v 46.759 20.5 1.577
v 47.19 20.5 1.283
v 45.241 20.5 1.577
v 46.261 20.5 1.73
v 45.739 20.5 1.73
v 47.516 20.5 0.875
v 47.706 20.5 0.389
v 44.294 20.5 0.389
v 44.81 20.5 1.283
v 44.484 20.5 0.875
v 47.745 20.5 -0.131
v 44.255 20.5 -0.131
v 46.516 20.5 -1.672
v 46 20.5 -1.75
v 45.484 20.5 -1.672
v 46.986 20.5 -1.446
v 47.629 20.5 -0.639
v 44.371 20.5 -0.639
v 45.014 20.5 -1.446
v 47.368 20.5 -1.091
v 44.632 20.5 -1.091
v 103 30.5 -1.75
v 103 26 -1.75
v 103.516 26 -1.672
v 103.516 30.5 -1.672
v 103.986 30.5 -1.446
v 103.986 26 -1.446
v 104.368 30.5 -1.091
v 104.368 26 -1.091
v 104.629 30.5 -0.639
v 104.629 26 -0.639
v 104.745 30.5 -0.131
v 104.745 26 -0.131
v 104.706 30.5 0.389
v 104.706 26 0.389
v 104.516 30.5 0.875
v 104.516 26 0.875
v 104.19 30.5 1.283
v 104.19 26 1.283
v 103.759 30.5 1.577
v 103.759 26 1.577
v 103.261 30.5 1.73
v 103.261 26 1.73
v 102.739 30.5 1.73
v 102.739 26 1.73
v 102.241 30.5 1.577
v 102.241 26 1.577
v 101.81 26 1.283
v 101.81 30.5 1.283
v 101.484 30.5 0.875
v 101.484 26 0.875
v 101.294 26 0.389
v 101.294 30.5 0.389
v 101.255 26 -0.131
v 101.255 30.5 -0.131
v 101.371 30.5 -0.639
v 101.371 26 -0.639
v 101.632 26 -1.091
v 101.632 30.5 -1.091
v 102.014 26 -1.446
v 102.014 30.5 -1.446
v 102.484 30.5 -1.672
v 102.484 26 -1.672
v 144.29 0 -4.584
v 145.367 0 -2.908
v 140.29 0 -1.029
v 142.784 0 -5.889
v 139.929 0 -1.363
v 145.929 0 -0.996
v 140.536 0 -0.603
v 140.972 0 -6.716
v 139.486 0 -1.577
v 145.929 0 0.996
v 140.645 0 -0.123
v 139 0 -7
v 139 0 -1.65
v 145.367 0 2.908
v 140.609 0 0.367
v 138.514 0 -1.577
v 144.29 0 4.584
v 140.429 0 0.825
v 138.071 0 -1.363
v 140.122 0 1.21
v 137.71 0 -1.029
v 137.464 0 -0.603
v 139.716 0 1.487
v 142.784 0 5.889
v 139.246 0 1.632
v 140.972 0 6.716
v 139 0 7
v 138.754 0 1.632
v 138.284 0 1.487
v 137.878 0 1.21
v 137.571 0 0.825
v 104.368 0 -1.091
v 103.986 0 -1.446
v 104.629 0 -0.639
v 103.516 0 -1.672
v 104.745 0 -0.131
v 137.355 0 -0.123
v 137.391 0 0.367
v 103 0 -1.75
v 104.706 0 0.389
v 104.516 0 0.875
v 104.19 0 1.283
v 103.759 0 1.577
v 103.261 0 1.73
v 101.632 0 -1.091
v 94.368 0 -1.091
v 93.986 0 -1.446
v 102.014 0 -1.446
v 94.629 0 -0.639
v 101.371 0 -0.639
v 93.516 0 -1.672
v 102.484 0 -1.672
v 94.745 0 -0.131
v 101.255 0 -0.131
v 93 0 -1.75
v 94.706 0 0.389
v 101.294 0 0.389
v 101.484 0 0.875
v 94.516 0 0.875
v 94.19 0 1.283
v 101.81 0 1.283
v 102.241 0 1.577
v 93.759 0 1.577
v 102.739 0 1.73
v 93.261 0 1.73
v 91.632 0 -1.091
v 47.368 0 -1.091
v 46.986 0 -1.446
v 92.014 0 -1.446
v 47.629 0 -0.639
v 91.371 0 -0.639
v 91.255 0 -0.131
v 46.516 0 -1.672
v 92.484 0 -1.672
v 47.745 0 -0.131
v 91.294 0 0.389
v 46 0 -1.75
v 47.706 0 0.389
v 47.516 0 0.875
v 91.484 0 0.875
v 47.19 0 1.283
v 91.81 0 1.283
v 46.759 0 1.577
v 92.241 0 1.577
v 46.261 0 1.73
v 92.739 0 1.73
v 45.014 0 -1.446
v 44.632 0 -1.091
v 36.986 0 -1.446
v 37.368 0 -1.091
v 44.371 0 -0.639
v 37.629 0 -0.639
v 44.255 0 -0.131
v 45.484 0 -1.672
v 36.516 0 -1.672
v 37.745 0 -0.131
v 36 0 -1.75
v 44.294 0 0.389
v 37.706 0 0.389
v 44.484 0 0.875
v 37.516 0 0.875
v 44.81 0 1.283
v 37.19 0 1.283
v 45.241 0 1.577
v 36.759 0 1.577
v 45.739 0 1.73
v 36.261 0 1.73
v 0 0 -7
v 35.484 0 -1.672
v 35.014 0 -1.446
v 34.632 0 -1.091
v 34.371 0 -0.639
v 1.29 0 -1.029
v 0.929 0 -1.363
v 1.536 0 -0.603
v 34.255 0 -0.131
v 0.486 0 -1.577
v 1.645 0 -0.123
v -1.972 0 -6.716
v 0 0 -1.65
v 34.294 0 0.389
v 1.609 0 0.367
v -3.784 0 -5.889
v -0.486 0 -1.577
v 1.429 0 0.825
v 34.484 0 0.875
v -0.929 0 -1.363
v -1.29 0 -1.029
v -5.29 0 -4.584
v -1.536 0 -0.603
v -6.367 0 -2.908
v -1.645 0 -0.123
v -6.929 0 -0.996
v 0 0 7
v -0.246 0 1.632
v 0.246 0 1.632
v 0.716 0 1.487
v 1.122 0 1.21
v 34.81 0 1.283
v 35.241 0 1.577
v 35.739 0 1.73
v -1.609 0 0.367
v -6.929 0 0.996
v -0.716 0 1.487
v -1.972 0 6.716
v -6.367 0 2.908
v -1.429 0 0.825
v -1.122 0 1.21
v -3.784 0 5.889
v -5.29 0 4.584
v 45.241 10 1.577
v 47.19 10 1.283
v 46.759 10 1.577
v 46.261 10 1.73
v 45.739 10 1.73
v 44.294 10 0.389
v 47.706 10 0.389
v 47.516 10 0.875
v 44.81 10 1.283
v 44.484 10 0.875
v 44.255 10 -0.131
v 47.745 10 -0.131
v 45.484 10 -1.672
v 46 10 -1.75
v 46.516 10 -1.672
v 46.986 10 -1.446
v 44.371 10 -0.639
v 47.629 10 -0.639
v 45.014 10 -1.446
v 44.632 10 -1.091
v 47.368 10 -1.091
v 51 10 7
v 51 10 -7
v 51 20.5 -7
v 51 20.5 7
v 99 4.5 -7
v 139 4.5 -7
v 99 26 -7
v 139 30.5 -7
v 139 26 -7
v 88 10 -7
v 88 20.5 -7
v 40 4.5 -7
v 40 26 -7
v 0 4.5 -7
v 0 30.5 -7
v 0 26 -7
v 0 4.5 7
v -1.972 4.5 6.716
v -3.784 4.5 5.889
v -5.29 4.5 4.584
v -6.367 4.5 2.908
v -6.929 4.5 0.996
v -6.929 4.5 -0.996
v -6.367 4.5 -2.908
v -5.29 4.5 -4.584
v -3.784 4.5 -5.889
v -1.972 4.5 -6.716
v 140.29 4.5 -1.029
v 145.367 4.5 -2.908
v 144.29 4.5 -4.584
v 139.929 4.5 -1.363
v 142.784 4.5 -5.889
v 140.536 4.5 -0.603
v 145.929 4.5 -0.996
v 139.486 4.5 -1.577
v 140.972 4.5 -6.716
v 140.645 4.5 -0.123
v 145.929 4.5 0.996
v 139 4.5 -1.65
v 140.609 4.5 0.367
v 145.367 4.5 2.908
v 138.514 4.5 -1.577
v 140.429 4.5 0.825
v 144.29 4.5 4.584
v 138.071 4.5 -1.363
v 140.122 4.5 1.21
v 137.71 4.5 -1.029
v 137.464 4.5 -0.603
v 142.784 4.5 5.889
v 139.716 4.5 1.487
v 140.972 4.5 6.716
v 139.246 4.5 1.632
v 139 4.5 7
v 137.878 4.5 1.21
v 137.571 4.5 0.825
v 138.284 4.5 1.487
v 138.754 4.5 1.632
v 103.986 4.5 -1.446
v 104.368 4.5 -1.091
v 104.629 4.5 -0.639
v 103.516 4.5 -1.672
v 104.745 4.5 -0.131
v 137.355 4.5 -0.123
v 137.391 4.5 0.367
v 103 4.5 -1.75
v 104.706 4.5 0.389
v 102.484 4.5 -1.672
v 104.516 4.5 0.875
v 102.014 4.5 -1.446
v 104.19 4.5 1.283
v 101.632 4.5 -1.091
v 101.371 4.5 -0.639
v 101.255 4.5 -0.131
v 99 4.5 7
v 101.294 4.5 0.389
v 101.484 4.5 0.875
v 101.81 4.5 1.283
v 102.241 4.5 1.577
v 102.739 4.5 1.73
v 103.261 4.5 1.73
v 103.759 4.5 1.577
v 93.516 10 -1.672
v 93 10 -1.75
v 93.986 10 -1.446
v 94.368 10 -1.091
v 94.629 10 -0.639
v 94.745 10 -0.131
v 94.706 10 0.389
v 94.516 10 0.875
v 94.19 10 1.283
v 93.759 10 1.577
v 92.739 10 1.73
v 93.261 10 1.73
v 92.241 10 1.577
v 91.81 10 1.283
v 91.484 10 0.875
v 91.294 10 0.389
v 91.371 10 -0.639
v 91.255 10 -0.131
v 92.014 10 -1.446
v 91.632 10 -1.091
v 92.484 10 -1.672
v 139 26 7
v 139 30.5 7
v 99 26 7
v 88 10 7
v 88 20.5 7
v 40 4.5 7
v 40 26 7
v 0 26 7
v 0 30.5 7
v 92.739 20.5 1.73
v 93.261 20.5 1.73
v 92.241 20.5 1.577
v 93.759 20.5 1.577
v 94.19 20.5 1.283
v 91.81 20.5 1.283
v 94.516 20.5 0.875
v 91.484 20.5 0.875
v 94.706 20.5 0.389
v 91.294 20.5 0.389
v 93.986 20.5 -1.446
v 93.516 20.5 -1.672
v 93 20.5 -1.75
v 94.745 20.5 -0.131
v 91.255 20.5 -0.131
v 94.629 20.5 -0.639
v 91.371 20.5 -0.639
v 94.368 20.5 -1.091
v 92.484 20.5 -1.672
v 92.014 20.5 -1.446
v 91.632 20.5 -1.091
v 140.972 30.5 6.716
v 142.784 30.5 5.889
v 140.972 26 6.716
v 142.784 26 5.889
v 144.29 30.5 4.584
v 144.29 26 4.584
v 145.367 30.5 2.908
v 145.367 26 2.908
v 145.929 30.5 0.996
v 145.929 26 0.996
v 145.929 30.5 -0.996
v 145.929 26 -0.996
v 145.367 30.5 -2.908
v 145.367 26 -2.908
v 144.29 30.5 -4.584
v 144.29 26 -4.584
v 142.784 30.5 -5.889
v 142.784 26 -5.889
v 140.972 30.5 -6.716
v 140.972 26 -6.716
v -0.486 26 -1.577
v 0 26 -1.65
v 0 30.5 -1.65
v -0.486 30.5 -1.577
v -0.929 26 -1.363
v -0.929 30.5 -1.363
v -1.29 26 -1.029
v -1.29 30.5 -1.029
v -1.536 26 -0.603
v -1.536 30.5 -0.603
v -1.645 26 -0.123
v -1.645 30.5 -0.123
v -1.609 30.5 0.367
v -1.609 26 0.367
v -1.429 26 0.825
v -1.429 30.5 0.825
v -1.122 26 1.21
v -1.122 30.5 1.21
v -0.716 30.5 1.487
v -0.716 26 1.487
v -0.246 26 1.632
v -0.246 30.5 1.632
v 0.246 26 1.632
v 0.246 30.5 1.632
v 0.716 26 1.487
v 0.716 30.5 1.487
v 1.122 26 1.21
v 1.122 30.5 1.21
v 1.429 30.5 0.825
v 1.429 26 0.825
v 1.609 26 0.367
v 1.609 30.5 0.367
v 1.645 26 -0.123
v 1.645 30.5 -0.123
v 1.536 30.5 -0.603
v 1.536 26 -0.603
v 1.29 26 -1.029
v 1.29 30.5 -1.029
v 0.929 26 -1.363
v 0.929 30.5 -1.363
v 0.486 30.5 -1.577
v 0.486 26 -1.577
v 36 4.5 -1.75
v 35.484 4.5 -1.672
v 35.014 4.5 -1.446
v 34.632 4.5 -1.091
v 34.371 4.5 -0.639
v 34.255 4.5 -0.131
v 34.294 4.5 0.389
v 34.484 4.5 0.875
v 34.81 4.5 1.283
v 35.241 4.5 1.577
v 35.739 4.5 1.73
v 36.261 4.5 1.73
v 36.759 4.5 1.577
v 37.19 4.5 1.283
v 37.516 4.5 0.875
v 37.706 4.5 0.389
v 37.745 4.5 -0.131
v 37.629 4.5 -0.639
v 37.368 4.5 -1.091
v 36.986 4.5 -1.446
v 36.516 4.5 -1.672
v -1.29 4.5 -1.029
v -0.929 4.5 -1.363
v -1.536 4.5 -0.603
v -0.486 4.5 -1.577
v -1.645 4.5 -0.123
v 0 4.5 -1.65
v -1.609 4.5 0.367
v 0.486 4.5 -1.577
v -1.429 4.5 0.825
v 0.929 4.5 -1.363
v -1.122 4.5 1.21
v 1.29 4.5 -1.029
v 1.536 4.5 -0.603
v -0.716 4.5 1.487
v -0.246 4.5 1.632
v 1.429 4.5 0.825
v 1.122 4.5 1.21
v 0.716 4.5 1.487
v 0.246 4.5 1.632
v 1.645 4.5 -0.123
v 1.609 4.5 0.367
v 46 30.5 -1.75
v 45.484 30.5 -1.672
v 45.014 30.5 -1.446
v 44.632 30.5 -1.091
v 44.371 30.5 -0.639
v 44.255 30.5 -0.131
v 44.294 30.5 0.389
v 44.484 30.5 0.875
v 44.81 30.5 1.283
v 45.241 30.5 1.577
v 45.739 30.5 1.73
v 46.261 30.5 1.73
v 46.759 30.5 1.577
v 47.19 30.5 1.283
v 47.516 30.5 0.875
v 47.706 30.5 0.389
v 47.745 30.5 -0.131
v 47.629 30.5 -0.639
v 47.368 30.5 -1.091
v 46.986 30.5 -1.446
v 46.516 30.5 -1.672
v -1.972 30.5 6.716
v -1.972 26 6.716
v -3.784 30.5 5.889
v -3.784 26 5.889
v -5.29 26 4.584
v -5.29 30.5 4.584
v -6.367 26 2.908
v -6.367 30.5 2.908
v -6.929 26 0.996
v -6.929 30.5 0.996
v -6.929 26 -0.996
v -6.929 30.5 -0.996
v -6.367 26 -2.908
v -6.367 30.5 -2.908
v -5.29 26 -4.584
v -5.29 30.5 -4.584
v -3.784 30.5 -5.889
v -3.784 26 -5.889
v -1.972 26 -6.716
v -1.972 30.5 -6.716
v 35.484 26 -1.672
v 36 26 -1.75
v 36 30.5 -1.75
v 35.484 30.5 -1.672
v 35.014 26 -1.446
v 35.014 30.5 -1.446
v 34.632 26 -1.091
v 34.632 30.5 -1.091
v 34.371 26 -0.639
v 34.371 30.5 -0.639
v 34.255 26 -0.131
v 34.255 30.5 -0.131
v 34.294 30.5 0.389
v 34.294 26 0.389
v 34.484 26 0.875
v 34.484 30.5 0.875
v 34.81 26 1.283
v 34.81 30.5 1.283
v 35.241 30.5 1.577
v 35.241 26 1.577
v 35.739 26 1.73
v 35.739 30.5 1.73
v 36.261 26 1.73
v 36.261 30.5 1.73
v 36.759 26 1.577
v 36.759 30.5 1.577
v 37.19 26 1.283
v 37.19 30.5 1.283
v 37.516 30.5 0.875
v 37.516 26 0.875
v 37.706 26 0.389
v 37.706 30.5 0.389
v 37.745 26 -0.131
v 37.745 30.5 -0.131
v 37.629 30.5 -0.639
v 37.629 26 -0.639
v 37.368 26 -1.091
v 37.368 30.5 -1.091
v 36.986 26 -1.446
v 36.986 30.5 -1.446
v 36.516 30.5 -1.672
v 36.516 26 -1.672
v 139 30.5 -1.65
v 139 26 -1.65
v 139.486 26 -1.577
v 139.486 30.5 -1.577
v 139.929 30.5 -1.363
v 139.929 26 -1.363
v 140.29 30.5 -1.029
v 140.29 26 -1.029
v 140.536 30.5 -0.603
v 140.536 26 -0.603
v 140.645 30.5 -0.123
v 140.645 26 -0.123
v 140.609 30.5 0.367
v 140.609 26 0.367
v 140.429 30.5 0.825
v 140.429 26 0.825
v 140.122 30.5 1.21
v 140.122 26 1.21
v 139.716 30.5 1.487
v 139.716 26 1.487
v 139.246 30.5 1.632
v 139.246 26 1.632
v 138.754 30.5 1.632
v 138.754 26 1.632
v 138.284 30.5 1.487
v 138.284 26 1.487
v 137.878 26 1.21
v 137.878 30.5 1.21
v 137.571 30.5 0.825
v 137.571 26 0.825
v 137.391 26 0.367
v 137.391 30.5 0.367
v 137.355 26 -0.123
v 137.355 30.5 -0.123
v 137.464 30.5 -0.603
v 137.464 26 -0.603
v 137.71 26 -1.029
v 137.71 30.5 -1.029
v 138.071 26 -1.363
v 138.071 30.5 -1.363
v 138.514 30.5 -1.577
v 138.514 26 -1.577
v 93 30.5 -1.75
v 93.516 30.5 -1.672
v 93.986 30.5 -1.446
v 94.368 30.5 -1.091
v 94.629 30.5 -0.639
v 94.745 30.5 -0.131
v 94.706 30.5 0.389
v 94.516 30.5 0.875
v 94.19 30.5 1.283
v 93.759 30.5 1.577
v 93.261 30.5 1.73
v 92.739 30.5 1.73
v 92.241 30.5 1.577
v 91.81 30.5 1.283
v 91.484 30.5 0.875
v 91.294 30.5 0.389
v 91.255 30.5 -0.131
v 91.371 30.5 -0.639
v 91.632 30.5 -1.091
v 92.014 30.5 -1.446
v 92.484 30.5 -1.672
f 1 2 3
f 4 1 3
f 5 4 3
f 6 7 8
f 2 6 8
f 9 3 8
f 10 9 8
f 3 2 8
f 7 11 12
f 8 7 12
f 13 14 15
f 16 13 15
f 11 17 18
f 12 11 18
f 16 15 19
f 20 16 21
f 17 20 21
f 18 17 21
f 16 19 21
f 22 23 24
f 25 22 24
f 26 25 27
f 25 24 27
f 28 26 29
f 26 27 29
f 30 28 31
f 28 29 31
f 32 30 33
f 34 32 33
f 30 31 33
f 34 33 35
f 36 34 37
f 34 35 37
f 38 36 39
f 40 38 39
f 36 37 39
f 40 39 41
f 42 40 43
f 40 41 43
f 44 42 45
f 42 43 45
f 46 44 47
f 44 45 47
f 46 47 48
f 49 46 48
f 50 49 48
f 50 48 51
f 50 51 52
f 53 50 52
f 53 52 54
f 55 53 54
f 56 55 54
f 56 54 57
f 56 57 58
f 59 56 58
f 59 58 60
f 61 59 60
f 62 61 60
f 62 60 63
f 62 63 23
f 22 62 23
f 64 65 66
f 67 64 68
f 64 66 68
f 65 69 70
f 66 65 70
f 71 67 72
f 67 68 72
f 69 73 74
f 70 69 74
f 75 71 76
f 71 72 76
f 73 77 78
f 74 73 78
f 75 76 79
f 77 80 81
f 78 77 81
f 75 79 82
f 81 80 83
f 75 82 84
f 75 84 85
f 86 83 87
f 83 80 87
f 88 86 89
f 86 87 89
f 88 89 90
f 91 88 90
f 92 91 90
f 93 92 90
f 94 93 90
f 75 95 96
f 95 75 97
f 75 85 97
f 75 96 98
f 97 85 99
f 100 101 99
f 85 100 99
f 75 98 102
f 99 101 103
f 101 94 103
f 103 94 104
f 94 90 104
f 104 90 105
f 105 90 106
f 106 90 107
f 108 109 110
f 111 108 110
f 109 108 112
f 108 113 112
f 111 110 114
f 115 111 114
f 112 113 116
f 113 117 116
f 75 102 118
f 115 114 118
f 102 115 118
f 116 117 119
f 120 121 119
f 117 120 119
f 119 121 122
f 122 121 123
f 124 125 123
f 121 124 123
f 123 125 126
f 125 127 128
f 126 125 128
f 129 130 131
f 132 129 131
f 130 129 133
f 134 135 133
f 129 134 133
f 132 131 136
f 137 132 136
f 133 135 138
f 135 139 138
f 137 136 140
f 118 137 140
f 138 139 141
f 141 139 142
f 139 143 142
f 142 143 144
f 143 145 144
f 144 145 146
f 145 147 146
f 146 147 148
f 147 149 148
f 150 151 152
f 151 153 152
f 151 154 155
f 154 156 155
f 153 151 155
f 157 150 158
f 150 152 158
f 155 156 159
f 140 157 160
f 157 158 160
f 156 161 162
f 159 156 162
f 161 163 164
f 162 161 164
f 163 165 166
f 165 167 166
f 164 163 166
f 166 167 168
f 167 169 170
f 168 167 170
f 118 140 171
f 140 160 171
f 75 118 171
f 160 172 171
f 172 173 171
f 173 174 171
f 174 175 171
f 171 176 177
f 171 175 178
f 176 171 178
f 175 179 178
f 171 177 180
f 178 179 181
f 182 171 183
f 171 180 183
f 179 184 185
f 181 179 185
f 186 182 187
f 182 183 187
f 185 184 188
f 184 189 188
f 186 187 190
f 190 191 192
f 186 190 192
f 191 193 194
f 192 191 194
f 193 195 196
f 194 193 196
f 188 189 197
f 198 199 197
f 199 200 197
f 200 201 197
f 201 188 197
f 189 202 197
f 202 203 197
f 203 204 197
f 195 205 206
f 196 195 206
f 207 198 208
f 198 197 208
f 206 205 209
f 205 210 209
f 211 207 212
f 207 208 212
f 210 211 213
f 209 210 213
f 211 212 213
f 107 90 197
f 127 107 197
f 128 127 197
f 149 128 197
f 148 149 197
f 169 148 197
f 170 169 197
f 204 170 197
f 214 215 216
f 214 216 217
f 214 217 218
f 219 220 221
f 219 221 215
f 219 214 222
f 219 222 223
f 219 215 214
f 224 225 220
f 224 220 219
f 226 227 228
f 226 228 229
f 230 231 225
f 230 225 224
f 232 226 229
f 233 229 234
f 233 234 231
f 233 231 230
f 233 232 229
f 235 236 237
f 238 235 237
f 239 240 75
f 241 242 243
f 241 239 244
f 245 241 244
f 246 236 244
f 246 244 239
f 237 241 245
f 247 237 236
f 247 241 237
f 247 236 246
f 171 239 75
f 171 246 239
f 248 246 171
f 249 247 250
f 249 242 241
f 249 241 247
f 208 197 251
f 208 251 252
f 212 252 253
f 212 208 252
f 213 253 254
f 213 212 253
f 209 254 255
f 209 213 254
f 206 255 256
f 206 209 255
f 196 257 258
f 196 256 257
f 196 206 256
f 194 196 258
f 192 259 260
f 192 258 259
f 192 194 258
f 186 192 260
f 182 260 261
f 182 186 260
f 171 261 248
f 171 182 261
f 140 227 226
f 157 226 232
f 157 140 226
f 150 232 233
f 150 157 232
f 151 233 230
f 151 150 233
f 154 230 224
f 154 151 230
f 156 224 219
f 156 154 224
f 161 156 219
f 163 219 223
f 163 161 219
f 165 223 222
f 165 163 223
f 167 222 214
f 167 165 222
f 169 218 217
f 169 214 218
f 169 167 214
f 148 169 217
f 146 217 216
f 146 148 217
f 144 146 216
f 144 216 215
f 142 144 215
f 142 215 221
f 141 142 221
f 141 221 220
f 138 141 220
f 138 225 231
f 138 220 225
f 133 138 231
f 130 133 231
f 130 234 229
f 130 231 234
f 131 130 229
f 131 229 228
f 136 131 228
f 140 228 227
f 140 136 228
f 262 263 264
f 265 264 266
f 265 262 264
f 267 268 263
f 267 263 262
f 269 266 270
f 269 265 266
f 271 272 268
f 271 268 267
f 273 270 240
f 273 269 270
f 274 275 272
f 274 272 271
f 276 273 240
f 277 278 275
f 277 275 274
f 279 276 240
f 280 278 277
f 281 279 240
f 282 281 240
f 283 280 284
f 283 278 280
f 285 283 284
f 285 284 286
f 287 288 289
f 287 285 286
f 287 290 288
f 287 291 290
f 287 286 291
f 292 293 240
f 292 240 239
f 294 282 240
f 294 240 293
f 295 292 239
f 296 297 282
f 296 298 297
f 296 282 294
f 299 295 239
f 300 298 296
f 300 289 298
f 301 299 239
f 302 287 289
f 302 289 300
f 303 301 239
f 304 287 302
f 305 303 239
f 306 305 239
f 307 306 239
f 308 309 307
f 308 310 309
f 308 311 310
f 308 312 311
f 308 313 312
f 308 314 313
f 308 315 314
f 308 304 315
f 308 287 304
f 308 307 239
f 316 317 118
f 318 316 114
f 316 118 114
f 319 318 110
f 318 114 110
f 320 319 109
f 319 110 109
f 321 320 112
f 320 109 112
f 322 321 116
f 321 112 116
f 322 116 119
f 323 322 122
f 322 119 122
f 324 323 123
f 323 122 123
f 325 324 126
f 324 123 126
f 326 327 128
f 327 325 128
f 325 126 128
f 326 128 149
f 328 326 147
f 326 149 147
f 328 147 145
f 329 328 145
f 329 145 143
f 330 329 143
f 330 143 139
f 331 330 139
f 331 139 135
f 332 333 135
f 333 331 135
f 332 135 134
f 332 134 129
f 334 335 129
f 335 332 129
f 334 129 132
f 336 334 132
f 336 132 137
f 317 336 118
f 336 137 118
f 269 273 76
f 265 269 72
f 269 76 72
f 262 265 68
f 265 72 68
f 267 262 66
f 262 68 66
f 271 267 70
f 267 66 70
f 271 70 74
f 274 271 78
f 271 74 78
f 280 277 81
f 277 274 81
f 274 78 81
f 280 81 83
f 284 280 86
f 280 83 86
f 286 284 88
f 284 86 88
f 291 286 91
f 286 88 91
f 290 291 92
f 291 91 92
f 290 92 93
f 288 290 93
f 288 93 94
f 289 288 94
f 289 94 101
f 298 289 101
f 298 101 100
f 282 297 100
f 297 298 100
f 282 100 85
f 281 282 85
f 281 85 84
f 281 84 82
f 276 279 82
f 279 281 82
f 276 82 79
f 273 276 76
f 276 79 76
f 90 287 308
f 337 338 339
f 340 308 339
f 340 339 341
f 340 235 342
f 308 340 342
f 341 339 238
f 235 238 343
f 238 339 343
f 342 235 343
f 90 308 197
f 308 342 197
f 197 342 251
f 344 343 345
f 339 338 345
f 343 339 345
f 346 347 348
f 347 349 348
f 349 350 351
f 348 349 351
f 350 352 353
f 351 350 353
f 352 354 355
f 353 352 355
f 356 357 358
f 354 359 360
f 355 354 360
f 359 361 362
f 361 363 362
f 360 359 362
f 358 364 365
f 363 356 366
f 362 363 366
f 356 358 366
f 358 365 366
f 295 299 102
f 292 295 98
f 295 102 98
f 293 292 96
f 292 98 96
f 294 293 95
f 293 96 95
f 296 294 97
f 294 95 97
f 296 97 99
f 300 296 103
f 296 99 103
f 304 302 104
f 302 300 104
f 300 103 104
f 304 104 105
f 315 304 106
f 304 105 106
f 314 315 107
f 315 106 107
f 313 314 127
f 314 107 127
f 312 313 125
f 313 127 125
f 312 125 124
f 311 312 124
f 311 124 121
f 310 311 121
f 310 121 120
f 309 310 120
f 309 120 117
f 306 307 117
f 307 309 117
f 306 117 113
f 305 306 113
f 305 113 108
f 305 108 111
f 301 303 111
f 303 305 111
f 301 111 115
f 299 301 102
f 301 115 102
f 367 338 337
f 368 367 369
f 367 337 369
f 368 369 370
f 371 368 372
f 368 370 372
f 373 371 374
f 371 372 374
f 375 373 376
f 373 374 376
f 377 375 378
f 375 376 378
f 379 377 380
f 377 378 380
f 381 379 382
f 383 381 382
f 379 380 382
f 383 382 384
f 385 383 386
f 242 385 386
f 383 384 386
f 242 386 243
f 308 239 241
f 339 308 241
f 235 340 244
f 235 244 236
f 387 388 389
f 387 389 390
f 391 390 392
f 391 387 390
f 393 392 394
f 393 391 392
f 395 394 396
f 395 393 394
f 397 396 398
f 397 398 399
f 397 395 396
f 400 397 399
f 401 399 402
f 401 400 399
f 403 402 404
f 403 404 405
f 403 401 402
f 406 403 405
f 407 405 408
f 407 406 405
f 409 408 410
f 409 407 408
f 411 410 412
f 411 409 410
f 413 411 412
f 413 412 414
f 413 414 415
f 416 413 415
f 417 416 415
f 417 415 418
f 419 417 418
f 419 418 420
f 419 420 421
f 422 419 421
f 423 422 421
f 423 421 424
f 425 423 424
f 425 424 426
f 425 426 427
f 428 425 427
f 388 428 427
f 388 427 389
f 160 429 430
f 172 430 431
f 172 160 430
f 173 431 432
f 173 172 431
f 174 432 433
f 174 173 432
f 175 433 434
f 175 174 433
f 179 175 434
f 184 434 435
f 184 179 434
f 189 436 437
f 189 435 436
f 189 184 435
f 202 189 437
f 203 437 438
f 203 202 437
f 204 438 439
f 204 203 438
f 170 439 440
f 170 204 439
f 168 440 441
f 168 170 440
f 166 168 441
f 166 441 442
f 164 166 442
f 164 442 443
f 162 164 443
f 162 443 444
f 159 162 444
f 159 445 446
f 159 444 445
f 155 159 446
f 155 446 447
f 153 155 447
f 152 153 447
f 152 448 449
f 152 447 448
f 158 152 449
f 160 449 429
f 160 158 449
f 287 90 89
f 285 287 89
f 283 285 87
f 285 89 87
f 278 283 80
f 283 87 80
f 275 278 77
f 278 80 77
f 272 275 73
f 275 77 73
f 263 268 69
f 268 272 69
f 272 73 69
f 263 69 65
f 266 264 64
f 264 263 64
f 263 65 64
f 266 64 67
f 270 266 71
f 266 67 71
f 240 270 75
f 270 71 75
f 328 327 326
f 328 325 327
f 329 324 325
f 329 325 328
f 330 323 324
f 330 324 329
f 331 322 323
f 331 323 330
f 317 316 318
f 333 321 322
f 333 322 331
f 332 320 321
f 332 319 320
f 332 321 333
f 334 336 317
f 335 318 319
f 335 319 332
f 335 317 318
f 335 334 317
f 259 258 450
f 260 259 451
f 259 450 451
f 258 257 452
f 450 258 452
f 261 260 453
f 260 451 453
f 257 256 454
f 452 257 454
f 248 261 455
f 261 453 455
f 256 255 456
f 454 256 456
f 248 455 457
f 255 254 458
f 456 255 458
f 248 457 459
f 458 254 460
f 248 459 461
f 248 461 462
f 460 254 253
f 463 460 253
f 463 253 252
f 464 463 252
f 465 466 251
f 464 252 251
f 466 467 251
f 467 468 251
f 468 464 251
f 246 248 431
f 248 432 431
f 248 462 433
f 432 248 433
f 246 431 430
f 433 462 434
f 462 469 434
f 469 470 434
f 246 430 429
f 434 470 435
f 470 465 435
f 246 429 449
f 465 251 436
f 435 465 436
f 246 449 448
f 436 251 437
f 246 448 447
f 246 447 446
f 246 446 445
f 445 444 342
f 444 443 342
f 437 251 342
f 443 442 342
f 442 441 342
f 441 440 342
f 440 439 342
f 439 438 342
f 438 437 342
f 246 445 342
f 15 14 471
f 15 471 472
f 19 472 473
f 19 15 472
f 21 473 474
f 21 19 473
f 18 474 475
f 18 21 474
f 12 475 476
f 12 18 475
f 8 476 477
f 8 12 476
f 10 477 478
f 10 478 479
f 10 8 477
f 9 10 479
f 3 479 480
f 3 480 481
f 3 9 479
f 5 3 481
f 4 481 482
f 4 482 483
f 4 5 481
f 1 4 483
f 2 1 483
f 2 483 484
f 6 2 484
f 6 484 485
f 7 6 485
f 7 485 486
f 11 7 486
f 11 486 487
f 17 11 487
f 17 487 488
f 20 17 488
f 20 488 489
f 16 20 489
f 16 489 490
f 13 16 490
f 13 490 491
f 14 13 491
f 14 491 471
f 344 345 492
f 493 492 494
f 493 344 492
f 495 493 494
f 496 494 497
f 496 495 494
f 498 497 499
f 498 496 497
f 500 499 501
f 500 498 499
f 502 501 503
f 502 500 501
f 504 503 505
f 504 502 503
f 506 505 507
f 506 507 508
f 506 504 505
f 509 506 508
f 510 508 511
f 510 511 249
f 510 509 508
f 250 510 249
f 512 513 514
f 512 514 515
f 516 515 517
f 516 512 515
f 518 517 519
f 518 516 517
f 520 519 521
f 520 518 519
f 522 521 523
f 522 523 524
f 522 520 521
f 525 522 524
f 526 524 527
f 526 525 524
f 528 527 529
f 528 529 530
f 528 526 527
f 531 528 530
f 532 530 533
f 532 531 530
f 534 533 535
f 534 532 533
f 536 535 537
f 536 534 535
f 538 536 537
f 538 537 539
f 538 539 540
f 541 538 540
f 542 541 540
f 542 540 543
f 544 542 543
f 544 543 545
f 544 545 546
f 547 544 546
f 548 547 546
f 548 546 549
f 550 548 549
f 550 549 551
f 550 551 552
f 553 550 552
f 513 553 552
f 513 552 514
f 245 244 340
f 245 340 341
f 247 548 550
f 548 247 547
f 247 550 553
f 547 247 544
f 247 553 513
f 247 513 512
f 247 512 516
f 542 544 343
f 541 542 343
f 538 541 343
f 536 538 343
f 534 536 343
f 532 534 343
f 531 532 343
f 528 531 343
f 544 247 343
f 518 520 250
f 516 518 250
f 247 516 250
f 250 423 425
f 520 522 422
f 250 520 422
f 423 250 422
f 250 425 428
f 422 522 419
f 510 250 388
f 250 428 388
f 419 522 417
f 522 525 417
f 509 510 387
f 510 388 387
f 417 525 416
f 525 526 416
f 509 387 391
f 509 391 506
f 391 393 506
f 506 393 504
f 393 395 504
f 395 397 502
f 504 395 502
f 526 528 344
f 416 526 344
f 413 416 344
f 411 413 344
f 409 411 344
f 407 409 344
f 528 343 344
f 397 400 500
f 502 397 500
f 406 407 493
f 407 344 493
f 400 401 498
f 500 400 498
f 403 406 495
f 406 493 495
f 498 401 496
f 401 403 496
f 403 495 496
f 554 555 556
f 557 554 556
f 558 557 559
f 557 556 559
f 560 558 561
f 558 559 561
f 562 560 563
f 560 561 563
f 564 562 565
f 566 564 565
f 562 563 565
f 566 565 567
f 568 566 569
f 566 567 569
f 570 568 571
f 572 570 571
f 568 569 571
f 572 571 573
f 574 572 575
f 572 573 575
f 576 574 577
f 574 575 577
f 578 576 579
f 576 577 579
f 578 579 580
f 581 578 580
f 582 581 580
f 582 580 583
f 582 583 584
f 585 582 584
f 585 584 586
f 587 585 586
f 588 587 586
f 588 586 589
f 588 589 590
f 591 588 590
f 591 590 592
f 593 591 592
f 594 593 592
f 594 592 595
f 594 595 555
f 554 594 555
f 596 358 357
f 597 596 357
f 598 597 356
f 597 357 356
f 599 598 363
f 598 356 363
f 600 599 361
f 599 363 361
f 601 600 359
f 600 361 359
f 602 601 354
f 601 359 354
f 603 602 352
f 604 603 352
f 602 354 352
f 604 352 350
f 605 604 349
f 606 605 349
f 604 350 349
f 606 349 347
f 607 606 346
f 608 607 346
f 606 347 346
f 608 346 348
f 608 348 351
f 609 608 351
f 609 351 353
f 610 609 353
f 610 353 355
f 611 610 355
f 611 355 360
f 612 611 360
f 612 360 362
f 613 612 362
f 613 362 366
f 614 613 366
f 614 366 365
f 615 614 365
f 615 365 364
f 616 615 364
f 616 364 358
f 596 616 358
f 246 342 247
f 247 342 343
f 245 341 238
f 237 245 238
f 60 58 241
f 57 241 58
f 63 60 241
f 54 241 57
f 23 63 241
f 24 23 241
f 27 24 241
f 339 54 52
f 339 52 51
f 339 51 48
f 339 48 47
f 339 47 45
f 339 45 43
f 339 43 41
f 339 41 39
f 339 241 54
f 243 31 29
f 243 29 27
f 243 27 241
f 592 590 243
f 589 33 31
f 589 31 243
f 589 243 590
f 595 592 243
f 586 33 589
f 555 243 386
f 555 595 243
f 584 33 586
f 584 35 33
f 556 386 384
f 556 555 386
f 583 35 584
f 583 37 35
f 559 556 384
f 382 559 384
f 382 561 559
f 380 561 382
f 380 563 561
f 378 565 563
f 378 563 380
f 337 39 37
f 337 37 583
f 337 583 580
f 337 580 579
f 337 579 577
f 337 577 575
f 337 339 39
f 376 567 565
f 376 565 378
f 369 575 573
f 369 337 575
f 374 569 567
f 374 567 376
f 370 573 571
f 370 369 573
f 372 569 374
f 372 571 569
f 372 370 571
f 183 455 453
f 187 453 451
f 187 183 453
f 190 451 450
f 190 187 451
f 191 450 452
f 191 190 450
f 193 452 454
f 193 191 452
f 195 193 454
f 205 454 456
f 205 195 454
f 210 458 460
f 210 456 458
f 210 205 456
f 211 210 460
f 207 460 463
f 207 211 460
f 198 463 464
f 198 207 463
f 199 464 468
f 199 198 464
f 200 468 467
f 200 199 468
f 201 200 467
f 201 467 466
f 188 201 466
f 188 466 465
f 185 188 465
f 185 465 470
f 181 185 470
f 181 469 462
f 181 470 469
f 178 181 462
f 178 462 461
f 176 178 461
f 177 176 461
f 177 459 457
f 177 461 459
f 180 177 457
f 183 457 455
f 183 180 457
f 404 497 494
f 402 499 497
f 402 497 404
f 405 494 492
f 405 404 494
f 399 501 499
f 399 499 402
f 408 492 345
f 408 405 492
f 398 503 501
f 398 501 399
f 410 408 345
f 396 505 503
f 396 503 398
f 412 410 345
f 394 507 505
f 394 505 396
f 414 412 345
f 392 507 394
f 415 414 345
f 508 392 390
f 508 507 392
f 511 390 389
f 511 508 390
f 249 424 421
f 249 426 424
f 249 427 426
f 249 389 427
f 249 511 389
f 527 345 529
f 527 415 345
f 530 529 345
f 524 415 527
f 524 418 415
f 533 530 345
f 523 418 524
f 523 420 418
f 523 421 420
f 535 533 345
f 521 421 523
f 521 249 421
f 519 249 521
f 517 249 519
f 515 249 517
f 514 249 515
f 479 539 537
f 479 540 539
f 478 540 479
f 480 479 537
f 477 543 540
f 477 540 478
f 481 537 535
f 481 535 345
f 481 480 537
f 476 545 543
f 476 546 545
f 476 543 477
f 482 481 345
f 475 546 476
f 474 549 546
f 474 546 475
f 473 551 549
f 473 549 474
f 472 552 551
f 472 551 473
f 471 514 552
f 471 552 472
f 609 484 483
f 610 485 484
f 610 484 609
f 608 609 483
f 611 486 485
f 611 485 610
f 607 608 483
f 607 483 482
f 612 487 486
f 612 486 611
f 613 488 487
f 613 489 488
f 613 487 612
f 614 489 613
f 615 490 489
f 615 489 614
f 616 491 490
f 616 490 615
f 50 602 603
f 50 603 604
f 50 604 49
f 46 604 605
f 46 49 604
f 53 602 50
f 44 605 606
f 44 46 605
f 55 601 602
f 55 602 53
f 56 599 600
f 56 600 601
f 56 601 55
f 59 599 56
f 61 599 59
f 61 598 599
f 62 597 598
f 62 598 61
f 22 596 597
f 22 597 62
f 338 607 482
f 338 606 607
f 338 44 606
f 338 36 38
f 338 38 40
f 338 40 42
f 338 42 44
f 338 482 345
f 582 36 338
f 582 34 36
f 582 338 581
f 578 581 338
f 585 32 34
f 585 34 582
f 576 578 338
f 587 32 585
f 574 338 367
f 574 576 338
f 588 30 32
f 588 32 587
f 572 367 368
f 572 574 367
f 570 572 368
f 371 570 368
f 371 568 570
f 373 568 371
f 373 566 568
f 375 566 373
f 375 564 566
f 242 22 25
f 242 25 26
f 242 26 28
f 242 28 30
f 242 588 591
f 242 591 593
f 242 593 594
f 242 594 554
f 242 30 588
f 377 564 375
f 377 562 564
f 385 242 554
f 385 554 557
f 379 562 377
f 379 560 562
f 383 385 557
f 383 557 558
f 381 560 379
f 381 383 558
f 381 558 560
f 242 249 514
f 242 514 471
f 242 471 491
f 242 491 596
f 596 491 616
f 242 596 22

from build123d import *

# Parameters (mm, degrees)
SKETCH_1_R          = 1.65
SKETCH_1_R_2        = 1.75
EXTRUDE_1_DEPTH     = 30.5
CUT_EXTRUDE_1_DEPTH = 62.051208014
SKETCH_3_W          = 20
SKETCH_3_H          = 10.5
CUT_EXTRUDE_2_DEPTH = 62.051208014
SKETCH_4_W          = 18.5
SKETCH_4_H          = 10
EXTRUDE_2_DEPTH     = 14
SKETCH_5_W          = 11
SKETCH_5_H          = 10.5
EXTRUDE_3_DEPTH     = 14


with BuildPart() as part:
    # ｽｹｯﾁ1 → ﾎﾞｽ - 押し出し1 (new body)
    with BuildSketch(Plane(origin=(0, 0, 0), x_dir=(1, 0, 0), z_dir=(0, 1, 0))):
        with BuildLine():
            Line((0, 7), (51, 7))
            Line((51, 7), (51, -7))
            Line((51, -7), (0, -7))
            ThreePointArc((0, -7), (-7, 0), (0, 7))
        make_face()
        with Locations(Location((0, 0, 0), (0, 0, 90))):
            Circle(SKETCH_1_R, mode=Mode.SUBTRACT)
        with Locations(Location((46, 0, 0), (0, 0, 90))):
            Circle(SKETCH_1_R_2, mode=Mode.SUBTRACT)
        with Locations(Location((36, 0, 0), (0, 0, 90))):
            Circle(SKETCH_1_R_2, mode=Mode.SUBTRACT)
    extrude(amount=EXTRUDE_1_DEPTH)

    # ｽｹｯﾁ2 → ｶｯﾄ - 押し出し1 (cut, through all)
    with BuildSketch(Plane.XY.offset(7)):
        Polygon((0, 26), (-7, 26), (-7, 4.5), (0, 4.5), (40, 4.5), (40, 26), align=None)
    extrude(amount=-CUT_EXTRUDE_1_DEPTH, mode=Mode.SUBTRACT)

    # ｽｹｯﾁ3 → ｶｯﾄ - 押し出し2 (cut, through all)
    with BuildSketch(Plane.XY.offset(7)):
        with Locations((41, 15.25)):
            Rectangle(SKETCH_3_W, SKETCH_3_H)
    extrude(amount=-CUT_EXTRUDE_2_DEPTH, mode=Mode.SUBTRACT)


with BuildPart() as cut_extrude_2_piece_1:
    # of the separate pieces the step leaves, piece 1, a body of its own (cut_extrude_2_pieces)
    add(part.part.solids().sort_by_distance((51, 20.5, -7))[0])


with BuildPart() as cut_extrude_2_piece_2:
    # of the separate pieces the step leaves, piece 2, a body of its own (cut_extrude_2_pieces)
    add(part.part.solids().sort_by_distance((0, 0, -7))[0])

    # ｽｹｯﾁ4 → ﾎﾞｽ - 押し出し2 (add)
    with BuildSketch(Plane.XY.offset(7)):
        with Locations((60.25, 25.5)):
            Rectangle(SKETCH_4_W, SKETCH_4_H)
        with Locations((60.25, 5)):
            Rectangle(SKETCH_4_W, SKETCH_4_H)
    extrude(amount=-EXTRUDE_2_DEPTH)


with BuildPart() as extrude_2_piece_1:
    # of the separate pieces the step leaves, piece 1, a body of its own (extrude_2_pieces)
    add(cut_extrude_2_piece_2.part.solids().sort_by_distance((0, 0, -7))[0])

    # ﾐﾗｰ1: ﾎﾞｽ - 押し出し2 piece 1 across plane


with BuildPart() as extrude_2_piece_2:
    # of the separate pieces the step leaves, piece 2, a body of its own (extrude_2_pieces)
    add(cut_extrude_2_piece_2.part.solids().sort_by_distance((51, 30.5, 7))[0])


with BuildPart() as extrude_2_piece_1_1:
    add(extrude_2_piece_1.part)
    add(extrude_2_piece_1.part.mirror(Plane(origin=(69.5, 10, -7), x_dir=(0, 0, 1), z_dir=(1, 0, 0))))


with BuildPart() as body_4:
    # ﾐﾗｰ2: mirrored copy
    add(extrude_2_piece_2.part.mirror(Plane(origin=(69.5, 30.5, -7), x_dir=(0, 0, 1), z_dir=(1, 0, 0))))


with BuildPart() as body_5:
    # Mirror 2 2: mirrored copy
    add(cut_extrude_2_piece_1.part.mirror(Plane(origin=(69.5, 30.5, -7), x_dir=(0, 0, 1), z_dir=(1, 0, 0))))


with BuildPart() as cut_extrude_2_piece_1_1:
    add(cut_extrude_2_piece_1.part)

    add(extrude_2_piece_1_1.part)  # ﾎﾞｽ - 押し出し3 merges ﾎﾞｽ - 押し出し2 piece 1

    add(extrude_2_piece_2.part)  # ﾎﾞｽ - 押し出し3 merges ﾎﾞｽ - 押し出し2 piece 2

    add(body_4.part)  # ﾎﾞｽ - 押し出し3 merges body 4

    add(body_5.part)  # ﾎﾞｽ - 押し出し3 merges body 5
    # ｽｹｯﾁ5 → ﾎﾞｽ - 押し出し3 (add)
    with BuildSketch(Plane(origin=(0, 0, -7), x_dir=(-1, 0, 0), z_dir=(0, 0, -1))):
        with Locations((-93.5, 15.25)):
            Rectangle(SKETCH_5_W, SKETCH_5_H)
        with Locations((-45.5, 15.25)):
            Rectangle(SKETCH_5_W, SKETCH_5_H)
    extrude(amount=-EXTRUDE_3_DEPTH)


solid = cut_extrude_2_piece_1_1.part
